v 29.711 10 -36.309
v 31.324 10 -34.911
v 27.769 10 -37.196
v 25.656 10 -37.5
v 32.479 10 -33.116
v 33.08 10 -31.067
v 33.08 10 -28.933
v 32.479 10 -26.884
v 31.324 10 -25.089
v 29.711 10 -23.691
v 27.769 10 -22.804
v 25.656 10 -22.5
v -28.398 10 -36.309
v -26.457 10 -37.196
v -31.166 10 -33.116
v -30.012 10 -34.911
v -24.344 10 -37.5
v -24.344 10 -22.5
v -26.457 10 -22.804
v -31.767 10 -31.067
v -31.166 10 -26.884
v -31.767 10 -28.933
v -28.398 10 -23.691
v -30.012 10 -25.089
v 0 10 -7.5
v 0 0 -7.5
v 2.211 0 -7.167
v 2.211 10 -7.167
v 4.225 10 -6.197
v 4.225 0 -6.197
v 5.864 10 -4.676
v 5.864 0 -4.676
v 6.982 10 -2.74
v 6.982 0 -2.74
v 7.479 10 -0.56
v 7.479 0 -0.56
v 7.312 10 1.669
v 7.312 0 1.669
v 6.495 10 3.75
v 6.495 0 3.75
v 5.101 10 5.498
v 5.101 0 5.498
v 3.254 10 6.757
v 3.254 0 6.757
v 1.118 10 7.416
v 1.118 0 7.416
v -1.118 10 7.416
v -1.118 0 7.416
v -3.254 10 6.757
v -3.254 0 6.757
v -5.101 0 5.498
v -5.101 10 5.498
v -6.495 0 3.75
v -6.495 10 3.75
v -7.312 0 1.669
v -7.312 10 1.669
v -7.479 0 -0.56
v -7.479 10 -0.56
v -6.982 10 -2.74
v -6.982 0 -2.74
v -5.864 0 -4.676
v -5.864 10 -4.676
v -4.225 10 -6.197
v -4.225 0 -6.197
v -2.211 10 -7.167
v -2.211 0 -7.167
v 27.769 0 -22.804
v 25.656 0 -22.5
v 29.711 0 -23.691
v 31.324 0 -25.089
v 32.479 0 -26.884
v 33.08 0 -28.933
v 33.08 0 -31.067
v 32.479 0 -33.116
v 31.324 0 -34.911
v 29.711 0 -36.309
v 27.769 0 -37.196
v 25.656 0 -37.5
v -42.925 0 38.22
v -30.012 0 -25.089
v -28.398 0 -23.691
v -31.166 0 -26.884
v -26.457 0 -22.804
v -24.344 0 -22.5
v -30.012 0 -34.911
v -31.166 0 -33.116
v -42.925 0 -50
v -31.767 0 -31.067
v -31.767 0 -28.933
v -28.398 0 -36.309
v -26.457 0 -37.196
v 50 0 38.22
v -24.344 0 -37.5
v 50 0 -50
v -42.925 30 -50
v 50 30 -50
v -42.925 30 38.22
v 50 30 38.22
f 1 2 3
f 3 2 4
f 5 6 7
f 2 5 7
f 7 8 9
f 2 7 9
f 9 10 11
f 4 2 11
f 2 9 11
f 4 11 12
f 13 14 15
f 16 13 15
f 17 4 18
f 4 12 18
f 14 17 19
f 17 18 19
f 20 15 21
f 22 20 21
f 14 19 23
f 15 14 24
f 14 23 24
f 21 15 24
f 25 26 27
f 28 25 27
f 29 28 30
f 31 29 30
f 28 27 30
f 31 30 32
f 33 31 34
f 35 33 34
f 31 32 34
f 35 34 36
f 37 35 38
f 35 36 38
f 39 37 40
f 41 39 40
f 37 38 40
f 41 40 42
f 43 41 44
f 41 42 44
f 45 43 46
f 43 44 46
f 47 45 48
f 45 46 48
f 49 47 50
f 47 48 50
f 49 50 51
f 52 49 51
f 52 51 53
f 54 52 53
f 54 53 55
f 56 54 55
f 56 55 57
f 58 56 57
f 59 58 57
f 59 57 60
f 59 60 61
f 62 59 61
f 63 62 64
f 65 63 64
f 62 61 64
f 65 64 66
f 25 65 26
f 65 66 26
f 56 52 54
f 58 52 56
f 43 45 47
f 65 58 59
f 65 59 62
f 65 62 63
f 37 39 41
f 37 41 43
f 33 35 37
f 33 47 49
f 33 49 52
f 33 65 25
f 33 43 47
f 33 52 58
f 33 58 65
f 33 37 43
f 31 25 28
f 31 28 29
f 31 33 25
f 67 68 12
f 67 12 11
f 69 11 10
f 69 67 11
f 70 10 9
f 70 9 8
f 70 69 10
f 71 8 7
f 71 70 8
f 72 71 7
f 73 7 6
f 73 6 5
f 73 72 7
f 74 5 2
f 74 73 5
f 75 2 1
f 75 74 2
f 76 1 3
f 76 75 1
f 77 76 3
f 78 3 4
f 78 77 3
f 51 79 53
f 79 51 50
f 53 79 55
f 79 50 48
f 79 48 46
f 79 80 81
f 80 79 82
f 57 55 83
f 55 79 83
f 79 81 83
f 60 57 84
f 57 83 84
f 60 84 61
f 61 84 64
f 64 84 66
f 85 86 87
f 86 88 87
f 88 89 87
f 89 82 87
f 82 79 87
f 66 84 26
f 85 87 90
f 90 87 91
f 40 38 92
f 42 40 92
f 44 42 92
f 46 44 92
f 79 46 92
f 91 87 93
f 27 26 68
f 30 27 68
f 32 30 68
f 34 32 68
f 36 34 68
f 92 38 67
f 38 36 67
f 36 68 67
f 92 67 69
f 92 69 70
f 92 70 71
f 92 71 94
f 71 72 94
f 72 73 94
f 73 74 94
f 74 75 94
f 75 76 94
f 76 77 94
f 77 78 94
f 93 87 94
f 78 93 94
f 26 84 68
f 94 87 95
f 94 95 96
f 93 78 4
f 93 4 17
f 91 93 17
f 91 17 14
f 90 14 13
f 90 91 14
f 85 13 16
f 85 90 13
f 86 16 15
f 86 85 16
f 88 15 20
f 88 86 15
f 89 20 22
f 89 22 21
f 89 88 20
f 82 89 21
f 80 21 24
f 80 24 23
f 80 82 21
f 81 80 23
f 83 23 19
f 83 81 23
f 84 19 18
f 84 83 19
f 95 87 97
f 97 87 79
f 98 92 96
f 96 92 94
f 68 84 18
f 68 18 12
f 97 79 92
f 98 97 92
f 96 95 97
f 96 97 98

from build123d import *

# Parameters (mm, degrees)
EXTRUDE_1_DEPTH     = 30
SKETCH_1_W          = 100
SKETCH_1_H          = 100
EXTRUDE_1_2_DEPTH   = 30
SKETCH_2_R          = 7.5
CUT_EXTRUDE_1_DEPTH = 10
CUT_EXTRUDE_2_DEPTH = 190.208879284
SKETCH_4_W          = 100
SKETCH_4_H          = 11.779621946
CUT_EXTRUDE_3_DEPTH = 77.811457479
SKETCH_5_W          = 7.075234897
SKETCH_5_H          = 88.220378054
CUT_EXTRUDE_5_DEPTH = 77.811457479


with BuildPart() as part:
    # 草图1 → 凸台-拉伸1 (new body)
    with BuildSketch(Plane(origin=(0, 0, 0), x_dir=(1, 0, 0), z_dir=(0, 1, 0))):
        Polygon((80, -50), (180, -50), (80, 50), align=None)
    extrude(amount=EXTRUDE_1_DEPTH)


with BuildPart() as body_2:
    # 草图1 → Extrude 1 2 (new body)
    with BuildSketch(Plane(origin=(0, 0, 0), x_dir=(1, 0, 0), z_dir=(0, 1, 0))):
        Rectangle(SKETCH_1_W, SKETCH_1_H)
    extrude(amount=EXTRUDE_1_2_DEPTH)

    # 草图2 → 切除-拉伸1 (cut)
    with BuildSketch(Plane.XZ):
        Circle(SKETCH_2_R)
        with BuildLine():
            Line((-24.343668286, -22.5), (25.656331714, -22.5))
            ThreePointArc((25.656331714, -22.5), (33.156331714, -30), (25.656331714, -37.5))
            Line((25.656331714, -37.5), (-24.343668286, -37.5))
            ThreePointArc((-24.343668286, -37.5), (-31.843668286, -30), (-24.343668286, -22.5))
        make_face()
    extrude(amount=-CUT_EXTRUDE_1_DEPTH, mode=Mode.SUBTRACT)

    # 草图4 → 切除-拉伸3 (cut, through all)
    with BuildSketch(Plane.XZ):
        with Locations((0, 44.110189027)):
            Rectangle(SKETCH_4_W, SKETCH_4_H)
    extrude(amount=-CUT_EXTRUDE_3_DEPTH, mode=Mode.SUBTRACT)

    # 草图5 → 切除-拉伸5 (cut, through all)
    with BuildSketch(Plane.XZ):
        with Locations((-46.462382551, -5.889810973)):
            Rectangle(SKETCH_5_W, SKETCH_5_H)
    extrude(amount=-CUT_EXTRUDE_5_DEPTH, mode=Mode.SUBTRACT)


with BuildPart() as body_3:
    # 镜向1: mirrored copy
    add(part.part.mirror(Plane(origin=(0, 0, 0), x_dir=(0, 0, 1), z_dir=(1, 0, 0))))


with BuildPart() as cut_extrude_2_tool:
    # 草图3 → 切除-拉伸2 (new, through all)
    with BuildSketch(Plane.XZ):
        Polygon((80, 50), (80, -50), (180, 50), align=None)
        Polygon((-80, -50), (-80, 50), (-180, 50), align=None)
    extrude(amount=-CUT_EXTRUDE_2_DEPTH)


with BuildPart() as part_1:
    add(part.part)

    # 切除-拉伸2: cut by cut_extrude_2_tool
    add(cut_extrude_2_tool.part, mode=Mode.SUBTRACT)


with BuildPart() as body_3_1:
    add(body_3.part)

    # 切除-拉伸2: cut by cut_extrude_2_tool
    add(cut_extrude_2_tool.part, mode=Mode.SUBTRACT)


solid = body_2.part
